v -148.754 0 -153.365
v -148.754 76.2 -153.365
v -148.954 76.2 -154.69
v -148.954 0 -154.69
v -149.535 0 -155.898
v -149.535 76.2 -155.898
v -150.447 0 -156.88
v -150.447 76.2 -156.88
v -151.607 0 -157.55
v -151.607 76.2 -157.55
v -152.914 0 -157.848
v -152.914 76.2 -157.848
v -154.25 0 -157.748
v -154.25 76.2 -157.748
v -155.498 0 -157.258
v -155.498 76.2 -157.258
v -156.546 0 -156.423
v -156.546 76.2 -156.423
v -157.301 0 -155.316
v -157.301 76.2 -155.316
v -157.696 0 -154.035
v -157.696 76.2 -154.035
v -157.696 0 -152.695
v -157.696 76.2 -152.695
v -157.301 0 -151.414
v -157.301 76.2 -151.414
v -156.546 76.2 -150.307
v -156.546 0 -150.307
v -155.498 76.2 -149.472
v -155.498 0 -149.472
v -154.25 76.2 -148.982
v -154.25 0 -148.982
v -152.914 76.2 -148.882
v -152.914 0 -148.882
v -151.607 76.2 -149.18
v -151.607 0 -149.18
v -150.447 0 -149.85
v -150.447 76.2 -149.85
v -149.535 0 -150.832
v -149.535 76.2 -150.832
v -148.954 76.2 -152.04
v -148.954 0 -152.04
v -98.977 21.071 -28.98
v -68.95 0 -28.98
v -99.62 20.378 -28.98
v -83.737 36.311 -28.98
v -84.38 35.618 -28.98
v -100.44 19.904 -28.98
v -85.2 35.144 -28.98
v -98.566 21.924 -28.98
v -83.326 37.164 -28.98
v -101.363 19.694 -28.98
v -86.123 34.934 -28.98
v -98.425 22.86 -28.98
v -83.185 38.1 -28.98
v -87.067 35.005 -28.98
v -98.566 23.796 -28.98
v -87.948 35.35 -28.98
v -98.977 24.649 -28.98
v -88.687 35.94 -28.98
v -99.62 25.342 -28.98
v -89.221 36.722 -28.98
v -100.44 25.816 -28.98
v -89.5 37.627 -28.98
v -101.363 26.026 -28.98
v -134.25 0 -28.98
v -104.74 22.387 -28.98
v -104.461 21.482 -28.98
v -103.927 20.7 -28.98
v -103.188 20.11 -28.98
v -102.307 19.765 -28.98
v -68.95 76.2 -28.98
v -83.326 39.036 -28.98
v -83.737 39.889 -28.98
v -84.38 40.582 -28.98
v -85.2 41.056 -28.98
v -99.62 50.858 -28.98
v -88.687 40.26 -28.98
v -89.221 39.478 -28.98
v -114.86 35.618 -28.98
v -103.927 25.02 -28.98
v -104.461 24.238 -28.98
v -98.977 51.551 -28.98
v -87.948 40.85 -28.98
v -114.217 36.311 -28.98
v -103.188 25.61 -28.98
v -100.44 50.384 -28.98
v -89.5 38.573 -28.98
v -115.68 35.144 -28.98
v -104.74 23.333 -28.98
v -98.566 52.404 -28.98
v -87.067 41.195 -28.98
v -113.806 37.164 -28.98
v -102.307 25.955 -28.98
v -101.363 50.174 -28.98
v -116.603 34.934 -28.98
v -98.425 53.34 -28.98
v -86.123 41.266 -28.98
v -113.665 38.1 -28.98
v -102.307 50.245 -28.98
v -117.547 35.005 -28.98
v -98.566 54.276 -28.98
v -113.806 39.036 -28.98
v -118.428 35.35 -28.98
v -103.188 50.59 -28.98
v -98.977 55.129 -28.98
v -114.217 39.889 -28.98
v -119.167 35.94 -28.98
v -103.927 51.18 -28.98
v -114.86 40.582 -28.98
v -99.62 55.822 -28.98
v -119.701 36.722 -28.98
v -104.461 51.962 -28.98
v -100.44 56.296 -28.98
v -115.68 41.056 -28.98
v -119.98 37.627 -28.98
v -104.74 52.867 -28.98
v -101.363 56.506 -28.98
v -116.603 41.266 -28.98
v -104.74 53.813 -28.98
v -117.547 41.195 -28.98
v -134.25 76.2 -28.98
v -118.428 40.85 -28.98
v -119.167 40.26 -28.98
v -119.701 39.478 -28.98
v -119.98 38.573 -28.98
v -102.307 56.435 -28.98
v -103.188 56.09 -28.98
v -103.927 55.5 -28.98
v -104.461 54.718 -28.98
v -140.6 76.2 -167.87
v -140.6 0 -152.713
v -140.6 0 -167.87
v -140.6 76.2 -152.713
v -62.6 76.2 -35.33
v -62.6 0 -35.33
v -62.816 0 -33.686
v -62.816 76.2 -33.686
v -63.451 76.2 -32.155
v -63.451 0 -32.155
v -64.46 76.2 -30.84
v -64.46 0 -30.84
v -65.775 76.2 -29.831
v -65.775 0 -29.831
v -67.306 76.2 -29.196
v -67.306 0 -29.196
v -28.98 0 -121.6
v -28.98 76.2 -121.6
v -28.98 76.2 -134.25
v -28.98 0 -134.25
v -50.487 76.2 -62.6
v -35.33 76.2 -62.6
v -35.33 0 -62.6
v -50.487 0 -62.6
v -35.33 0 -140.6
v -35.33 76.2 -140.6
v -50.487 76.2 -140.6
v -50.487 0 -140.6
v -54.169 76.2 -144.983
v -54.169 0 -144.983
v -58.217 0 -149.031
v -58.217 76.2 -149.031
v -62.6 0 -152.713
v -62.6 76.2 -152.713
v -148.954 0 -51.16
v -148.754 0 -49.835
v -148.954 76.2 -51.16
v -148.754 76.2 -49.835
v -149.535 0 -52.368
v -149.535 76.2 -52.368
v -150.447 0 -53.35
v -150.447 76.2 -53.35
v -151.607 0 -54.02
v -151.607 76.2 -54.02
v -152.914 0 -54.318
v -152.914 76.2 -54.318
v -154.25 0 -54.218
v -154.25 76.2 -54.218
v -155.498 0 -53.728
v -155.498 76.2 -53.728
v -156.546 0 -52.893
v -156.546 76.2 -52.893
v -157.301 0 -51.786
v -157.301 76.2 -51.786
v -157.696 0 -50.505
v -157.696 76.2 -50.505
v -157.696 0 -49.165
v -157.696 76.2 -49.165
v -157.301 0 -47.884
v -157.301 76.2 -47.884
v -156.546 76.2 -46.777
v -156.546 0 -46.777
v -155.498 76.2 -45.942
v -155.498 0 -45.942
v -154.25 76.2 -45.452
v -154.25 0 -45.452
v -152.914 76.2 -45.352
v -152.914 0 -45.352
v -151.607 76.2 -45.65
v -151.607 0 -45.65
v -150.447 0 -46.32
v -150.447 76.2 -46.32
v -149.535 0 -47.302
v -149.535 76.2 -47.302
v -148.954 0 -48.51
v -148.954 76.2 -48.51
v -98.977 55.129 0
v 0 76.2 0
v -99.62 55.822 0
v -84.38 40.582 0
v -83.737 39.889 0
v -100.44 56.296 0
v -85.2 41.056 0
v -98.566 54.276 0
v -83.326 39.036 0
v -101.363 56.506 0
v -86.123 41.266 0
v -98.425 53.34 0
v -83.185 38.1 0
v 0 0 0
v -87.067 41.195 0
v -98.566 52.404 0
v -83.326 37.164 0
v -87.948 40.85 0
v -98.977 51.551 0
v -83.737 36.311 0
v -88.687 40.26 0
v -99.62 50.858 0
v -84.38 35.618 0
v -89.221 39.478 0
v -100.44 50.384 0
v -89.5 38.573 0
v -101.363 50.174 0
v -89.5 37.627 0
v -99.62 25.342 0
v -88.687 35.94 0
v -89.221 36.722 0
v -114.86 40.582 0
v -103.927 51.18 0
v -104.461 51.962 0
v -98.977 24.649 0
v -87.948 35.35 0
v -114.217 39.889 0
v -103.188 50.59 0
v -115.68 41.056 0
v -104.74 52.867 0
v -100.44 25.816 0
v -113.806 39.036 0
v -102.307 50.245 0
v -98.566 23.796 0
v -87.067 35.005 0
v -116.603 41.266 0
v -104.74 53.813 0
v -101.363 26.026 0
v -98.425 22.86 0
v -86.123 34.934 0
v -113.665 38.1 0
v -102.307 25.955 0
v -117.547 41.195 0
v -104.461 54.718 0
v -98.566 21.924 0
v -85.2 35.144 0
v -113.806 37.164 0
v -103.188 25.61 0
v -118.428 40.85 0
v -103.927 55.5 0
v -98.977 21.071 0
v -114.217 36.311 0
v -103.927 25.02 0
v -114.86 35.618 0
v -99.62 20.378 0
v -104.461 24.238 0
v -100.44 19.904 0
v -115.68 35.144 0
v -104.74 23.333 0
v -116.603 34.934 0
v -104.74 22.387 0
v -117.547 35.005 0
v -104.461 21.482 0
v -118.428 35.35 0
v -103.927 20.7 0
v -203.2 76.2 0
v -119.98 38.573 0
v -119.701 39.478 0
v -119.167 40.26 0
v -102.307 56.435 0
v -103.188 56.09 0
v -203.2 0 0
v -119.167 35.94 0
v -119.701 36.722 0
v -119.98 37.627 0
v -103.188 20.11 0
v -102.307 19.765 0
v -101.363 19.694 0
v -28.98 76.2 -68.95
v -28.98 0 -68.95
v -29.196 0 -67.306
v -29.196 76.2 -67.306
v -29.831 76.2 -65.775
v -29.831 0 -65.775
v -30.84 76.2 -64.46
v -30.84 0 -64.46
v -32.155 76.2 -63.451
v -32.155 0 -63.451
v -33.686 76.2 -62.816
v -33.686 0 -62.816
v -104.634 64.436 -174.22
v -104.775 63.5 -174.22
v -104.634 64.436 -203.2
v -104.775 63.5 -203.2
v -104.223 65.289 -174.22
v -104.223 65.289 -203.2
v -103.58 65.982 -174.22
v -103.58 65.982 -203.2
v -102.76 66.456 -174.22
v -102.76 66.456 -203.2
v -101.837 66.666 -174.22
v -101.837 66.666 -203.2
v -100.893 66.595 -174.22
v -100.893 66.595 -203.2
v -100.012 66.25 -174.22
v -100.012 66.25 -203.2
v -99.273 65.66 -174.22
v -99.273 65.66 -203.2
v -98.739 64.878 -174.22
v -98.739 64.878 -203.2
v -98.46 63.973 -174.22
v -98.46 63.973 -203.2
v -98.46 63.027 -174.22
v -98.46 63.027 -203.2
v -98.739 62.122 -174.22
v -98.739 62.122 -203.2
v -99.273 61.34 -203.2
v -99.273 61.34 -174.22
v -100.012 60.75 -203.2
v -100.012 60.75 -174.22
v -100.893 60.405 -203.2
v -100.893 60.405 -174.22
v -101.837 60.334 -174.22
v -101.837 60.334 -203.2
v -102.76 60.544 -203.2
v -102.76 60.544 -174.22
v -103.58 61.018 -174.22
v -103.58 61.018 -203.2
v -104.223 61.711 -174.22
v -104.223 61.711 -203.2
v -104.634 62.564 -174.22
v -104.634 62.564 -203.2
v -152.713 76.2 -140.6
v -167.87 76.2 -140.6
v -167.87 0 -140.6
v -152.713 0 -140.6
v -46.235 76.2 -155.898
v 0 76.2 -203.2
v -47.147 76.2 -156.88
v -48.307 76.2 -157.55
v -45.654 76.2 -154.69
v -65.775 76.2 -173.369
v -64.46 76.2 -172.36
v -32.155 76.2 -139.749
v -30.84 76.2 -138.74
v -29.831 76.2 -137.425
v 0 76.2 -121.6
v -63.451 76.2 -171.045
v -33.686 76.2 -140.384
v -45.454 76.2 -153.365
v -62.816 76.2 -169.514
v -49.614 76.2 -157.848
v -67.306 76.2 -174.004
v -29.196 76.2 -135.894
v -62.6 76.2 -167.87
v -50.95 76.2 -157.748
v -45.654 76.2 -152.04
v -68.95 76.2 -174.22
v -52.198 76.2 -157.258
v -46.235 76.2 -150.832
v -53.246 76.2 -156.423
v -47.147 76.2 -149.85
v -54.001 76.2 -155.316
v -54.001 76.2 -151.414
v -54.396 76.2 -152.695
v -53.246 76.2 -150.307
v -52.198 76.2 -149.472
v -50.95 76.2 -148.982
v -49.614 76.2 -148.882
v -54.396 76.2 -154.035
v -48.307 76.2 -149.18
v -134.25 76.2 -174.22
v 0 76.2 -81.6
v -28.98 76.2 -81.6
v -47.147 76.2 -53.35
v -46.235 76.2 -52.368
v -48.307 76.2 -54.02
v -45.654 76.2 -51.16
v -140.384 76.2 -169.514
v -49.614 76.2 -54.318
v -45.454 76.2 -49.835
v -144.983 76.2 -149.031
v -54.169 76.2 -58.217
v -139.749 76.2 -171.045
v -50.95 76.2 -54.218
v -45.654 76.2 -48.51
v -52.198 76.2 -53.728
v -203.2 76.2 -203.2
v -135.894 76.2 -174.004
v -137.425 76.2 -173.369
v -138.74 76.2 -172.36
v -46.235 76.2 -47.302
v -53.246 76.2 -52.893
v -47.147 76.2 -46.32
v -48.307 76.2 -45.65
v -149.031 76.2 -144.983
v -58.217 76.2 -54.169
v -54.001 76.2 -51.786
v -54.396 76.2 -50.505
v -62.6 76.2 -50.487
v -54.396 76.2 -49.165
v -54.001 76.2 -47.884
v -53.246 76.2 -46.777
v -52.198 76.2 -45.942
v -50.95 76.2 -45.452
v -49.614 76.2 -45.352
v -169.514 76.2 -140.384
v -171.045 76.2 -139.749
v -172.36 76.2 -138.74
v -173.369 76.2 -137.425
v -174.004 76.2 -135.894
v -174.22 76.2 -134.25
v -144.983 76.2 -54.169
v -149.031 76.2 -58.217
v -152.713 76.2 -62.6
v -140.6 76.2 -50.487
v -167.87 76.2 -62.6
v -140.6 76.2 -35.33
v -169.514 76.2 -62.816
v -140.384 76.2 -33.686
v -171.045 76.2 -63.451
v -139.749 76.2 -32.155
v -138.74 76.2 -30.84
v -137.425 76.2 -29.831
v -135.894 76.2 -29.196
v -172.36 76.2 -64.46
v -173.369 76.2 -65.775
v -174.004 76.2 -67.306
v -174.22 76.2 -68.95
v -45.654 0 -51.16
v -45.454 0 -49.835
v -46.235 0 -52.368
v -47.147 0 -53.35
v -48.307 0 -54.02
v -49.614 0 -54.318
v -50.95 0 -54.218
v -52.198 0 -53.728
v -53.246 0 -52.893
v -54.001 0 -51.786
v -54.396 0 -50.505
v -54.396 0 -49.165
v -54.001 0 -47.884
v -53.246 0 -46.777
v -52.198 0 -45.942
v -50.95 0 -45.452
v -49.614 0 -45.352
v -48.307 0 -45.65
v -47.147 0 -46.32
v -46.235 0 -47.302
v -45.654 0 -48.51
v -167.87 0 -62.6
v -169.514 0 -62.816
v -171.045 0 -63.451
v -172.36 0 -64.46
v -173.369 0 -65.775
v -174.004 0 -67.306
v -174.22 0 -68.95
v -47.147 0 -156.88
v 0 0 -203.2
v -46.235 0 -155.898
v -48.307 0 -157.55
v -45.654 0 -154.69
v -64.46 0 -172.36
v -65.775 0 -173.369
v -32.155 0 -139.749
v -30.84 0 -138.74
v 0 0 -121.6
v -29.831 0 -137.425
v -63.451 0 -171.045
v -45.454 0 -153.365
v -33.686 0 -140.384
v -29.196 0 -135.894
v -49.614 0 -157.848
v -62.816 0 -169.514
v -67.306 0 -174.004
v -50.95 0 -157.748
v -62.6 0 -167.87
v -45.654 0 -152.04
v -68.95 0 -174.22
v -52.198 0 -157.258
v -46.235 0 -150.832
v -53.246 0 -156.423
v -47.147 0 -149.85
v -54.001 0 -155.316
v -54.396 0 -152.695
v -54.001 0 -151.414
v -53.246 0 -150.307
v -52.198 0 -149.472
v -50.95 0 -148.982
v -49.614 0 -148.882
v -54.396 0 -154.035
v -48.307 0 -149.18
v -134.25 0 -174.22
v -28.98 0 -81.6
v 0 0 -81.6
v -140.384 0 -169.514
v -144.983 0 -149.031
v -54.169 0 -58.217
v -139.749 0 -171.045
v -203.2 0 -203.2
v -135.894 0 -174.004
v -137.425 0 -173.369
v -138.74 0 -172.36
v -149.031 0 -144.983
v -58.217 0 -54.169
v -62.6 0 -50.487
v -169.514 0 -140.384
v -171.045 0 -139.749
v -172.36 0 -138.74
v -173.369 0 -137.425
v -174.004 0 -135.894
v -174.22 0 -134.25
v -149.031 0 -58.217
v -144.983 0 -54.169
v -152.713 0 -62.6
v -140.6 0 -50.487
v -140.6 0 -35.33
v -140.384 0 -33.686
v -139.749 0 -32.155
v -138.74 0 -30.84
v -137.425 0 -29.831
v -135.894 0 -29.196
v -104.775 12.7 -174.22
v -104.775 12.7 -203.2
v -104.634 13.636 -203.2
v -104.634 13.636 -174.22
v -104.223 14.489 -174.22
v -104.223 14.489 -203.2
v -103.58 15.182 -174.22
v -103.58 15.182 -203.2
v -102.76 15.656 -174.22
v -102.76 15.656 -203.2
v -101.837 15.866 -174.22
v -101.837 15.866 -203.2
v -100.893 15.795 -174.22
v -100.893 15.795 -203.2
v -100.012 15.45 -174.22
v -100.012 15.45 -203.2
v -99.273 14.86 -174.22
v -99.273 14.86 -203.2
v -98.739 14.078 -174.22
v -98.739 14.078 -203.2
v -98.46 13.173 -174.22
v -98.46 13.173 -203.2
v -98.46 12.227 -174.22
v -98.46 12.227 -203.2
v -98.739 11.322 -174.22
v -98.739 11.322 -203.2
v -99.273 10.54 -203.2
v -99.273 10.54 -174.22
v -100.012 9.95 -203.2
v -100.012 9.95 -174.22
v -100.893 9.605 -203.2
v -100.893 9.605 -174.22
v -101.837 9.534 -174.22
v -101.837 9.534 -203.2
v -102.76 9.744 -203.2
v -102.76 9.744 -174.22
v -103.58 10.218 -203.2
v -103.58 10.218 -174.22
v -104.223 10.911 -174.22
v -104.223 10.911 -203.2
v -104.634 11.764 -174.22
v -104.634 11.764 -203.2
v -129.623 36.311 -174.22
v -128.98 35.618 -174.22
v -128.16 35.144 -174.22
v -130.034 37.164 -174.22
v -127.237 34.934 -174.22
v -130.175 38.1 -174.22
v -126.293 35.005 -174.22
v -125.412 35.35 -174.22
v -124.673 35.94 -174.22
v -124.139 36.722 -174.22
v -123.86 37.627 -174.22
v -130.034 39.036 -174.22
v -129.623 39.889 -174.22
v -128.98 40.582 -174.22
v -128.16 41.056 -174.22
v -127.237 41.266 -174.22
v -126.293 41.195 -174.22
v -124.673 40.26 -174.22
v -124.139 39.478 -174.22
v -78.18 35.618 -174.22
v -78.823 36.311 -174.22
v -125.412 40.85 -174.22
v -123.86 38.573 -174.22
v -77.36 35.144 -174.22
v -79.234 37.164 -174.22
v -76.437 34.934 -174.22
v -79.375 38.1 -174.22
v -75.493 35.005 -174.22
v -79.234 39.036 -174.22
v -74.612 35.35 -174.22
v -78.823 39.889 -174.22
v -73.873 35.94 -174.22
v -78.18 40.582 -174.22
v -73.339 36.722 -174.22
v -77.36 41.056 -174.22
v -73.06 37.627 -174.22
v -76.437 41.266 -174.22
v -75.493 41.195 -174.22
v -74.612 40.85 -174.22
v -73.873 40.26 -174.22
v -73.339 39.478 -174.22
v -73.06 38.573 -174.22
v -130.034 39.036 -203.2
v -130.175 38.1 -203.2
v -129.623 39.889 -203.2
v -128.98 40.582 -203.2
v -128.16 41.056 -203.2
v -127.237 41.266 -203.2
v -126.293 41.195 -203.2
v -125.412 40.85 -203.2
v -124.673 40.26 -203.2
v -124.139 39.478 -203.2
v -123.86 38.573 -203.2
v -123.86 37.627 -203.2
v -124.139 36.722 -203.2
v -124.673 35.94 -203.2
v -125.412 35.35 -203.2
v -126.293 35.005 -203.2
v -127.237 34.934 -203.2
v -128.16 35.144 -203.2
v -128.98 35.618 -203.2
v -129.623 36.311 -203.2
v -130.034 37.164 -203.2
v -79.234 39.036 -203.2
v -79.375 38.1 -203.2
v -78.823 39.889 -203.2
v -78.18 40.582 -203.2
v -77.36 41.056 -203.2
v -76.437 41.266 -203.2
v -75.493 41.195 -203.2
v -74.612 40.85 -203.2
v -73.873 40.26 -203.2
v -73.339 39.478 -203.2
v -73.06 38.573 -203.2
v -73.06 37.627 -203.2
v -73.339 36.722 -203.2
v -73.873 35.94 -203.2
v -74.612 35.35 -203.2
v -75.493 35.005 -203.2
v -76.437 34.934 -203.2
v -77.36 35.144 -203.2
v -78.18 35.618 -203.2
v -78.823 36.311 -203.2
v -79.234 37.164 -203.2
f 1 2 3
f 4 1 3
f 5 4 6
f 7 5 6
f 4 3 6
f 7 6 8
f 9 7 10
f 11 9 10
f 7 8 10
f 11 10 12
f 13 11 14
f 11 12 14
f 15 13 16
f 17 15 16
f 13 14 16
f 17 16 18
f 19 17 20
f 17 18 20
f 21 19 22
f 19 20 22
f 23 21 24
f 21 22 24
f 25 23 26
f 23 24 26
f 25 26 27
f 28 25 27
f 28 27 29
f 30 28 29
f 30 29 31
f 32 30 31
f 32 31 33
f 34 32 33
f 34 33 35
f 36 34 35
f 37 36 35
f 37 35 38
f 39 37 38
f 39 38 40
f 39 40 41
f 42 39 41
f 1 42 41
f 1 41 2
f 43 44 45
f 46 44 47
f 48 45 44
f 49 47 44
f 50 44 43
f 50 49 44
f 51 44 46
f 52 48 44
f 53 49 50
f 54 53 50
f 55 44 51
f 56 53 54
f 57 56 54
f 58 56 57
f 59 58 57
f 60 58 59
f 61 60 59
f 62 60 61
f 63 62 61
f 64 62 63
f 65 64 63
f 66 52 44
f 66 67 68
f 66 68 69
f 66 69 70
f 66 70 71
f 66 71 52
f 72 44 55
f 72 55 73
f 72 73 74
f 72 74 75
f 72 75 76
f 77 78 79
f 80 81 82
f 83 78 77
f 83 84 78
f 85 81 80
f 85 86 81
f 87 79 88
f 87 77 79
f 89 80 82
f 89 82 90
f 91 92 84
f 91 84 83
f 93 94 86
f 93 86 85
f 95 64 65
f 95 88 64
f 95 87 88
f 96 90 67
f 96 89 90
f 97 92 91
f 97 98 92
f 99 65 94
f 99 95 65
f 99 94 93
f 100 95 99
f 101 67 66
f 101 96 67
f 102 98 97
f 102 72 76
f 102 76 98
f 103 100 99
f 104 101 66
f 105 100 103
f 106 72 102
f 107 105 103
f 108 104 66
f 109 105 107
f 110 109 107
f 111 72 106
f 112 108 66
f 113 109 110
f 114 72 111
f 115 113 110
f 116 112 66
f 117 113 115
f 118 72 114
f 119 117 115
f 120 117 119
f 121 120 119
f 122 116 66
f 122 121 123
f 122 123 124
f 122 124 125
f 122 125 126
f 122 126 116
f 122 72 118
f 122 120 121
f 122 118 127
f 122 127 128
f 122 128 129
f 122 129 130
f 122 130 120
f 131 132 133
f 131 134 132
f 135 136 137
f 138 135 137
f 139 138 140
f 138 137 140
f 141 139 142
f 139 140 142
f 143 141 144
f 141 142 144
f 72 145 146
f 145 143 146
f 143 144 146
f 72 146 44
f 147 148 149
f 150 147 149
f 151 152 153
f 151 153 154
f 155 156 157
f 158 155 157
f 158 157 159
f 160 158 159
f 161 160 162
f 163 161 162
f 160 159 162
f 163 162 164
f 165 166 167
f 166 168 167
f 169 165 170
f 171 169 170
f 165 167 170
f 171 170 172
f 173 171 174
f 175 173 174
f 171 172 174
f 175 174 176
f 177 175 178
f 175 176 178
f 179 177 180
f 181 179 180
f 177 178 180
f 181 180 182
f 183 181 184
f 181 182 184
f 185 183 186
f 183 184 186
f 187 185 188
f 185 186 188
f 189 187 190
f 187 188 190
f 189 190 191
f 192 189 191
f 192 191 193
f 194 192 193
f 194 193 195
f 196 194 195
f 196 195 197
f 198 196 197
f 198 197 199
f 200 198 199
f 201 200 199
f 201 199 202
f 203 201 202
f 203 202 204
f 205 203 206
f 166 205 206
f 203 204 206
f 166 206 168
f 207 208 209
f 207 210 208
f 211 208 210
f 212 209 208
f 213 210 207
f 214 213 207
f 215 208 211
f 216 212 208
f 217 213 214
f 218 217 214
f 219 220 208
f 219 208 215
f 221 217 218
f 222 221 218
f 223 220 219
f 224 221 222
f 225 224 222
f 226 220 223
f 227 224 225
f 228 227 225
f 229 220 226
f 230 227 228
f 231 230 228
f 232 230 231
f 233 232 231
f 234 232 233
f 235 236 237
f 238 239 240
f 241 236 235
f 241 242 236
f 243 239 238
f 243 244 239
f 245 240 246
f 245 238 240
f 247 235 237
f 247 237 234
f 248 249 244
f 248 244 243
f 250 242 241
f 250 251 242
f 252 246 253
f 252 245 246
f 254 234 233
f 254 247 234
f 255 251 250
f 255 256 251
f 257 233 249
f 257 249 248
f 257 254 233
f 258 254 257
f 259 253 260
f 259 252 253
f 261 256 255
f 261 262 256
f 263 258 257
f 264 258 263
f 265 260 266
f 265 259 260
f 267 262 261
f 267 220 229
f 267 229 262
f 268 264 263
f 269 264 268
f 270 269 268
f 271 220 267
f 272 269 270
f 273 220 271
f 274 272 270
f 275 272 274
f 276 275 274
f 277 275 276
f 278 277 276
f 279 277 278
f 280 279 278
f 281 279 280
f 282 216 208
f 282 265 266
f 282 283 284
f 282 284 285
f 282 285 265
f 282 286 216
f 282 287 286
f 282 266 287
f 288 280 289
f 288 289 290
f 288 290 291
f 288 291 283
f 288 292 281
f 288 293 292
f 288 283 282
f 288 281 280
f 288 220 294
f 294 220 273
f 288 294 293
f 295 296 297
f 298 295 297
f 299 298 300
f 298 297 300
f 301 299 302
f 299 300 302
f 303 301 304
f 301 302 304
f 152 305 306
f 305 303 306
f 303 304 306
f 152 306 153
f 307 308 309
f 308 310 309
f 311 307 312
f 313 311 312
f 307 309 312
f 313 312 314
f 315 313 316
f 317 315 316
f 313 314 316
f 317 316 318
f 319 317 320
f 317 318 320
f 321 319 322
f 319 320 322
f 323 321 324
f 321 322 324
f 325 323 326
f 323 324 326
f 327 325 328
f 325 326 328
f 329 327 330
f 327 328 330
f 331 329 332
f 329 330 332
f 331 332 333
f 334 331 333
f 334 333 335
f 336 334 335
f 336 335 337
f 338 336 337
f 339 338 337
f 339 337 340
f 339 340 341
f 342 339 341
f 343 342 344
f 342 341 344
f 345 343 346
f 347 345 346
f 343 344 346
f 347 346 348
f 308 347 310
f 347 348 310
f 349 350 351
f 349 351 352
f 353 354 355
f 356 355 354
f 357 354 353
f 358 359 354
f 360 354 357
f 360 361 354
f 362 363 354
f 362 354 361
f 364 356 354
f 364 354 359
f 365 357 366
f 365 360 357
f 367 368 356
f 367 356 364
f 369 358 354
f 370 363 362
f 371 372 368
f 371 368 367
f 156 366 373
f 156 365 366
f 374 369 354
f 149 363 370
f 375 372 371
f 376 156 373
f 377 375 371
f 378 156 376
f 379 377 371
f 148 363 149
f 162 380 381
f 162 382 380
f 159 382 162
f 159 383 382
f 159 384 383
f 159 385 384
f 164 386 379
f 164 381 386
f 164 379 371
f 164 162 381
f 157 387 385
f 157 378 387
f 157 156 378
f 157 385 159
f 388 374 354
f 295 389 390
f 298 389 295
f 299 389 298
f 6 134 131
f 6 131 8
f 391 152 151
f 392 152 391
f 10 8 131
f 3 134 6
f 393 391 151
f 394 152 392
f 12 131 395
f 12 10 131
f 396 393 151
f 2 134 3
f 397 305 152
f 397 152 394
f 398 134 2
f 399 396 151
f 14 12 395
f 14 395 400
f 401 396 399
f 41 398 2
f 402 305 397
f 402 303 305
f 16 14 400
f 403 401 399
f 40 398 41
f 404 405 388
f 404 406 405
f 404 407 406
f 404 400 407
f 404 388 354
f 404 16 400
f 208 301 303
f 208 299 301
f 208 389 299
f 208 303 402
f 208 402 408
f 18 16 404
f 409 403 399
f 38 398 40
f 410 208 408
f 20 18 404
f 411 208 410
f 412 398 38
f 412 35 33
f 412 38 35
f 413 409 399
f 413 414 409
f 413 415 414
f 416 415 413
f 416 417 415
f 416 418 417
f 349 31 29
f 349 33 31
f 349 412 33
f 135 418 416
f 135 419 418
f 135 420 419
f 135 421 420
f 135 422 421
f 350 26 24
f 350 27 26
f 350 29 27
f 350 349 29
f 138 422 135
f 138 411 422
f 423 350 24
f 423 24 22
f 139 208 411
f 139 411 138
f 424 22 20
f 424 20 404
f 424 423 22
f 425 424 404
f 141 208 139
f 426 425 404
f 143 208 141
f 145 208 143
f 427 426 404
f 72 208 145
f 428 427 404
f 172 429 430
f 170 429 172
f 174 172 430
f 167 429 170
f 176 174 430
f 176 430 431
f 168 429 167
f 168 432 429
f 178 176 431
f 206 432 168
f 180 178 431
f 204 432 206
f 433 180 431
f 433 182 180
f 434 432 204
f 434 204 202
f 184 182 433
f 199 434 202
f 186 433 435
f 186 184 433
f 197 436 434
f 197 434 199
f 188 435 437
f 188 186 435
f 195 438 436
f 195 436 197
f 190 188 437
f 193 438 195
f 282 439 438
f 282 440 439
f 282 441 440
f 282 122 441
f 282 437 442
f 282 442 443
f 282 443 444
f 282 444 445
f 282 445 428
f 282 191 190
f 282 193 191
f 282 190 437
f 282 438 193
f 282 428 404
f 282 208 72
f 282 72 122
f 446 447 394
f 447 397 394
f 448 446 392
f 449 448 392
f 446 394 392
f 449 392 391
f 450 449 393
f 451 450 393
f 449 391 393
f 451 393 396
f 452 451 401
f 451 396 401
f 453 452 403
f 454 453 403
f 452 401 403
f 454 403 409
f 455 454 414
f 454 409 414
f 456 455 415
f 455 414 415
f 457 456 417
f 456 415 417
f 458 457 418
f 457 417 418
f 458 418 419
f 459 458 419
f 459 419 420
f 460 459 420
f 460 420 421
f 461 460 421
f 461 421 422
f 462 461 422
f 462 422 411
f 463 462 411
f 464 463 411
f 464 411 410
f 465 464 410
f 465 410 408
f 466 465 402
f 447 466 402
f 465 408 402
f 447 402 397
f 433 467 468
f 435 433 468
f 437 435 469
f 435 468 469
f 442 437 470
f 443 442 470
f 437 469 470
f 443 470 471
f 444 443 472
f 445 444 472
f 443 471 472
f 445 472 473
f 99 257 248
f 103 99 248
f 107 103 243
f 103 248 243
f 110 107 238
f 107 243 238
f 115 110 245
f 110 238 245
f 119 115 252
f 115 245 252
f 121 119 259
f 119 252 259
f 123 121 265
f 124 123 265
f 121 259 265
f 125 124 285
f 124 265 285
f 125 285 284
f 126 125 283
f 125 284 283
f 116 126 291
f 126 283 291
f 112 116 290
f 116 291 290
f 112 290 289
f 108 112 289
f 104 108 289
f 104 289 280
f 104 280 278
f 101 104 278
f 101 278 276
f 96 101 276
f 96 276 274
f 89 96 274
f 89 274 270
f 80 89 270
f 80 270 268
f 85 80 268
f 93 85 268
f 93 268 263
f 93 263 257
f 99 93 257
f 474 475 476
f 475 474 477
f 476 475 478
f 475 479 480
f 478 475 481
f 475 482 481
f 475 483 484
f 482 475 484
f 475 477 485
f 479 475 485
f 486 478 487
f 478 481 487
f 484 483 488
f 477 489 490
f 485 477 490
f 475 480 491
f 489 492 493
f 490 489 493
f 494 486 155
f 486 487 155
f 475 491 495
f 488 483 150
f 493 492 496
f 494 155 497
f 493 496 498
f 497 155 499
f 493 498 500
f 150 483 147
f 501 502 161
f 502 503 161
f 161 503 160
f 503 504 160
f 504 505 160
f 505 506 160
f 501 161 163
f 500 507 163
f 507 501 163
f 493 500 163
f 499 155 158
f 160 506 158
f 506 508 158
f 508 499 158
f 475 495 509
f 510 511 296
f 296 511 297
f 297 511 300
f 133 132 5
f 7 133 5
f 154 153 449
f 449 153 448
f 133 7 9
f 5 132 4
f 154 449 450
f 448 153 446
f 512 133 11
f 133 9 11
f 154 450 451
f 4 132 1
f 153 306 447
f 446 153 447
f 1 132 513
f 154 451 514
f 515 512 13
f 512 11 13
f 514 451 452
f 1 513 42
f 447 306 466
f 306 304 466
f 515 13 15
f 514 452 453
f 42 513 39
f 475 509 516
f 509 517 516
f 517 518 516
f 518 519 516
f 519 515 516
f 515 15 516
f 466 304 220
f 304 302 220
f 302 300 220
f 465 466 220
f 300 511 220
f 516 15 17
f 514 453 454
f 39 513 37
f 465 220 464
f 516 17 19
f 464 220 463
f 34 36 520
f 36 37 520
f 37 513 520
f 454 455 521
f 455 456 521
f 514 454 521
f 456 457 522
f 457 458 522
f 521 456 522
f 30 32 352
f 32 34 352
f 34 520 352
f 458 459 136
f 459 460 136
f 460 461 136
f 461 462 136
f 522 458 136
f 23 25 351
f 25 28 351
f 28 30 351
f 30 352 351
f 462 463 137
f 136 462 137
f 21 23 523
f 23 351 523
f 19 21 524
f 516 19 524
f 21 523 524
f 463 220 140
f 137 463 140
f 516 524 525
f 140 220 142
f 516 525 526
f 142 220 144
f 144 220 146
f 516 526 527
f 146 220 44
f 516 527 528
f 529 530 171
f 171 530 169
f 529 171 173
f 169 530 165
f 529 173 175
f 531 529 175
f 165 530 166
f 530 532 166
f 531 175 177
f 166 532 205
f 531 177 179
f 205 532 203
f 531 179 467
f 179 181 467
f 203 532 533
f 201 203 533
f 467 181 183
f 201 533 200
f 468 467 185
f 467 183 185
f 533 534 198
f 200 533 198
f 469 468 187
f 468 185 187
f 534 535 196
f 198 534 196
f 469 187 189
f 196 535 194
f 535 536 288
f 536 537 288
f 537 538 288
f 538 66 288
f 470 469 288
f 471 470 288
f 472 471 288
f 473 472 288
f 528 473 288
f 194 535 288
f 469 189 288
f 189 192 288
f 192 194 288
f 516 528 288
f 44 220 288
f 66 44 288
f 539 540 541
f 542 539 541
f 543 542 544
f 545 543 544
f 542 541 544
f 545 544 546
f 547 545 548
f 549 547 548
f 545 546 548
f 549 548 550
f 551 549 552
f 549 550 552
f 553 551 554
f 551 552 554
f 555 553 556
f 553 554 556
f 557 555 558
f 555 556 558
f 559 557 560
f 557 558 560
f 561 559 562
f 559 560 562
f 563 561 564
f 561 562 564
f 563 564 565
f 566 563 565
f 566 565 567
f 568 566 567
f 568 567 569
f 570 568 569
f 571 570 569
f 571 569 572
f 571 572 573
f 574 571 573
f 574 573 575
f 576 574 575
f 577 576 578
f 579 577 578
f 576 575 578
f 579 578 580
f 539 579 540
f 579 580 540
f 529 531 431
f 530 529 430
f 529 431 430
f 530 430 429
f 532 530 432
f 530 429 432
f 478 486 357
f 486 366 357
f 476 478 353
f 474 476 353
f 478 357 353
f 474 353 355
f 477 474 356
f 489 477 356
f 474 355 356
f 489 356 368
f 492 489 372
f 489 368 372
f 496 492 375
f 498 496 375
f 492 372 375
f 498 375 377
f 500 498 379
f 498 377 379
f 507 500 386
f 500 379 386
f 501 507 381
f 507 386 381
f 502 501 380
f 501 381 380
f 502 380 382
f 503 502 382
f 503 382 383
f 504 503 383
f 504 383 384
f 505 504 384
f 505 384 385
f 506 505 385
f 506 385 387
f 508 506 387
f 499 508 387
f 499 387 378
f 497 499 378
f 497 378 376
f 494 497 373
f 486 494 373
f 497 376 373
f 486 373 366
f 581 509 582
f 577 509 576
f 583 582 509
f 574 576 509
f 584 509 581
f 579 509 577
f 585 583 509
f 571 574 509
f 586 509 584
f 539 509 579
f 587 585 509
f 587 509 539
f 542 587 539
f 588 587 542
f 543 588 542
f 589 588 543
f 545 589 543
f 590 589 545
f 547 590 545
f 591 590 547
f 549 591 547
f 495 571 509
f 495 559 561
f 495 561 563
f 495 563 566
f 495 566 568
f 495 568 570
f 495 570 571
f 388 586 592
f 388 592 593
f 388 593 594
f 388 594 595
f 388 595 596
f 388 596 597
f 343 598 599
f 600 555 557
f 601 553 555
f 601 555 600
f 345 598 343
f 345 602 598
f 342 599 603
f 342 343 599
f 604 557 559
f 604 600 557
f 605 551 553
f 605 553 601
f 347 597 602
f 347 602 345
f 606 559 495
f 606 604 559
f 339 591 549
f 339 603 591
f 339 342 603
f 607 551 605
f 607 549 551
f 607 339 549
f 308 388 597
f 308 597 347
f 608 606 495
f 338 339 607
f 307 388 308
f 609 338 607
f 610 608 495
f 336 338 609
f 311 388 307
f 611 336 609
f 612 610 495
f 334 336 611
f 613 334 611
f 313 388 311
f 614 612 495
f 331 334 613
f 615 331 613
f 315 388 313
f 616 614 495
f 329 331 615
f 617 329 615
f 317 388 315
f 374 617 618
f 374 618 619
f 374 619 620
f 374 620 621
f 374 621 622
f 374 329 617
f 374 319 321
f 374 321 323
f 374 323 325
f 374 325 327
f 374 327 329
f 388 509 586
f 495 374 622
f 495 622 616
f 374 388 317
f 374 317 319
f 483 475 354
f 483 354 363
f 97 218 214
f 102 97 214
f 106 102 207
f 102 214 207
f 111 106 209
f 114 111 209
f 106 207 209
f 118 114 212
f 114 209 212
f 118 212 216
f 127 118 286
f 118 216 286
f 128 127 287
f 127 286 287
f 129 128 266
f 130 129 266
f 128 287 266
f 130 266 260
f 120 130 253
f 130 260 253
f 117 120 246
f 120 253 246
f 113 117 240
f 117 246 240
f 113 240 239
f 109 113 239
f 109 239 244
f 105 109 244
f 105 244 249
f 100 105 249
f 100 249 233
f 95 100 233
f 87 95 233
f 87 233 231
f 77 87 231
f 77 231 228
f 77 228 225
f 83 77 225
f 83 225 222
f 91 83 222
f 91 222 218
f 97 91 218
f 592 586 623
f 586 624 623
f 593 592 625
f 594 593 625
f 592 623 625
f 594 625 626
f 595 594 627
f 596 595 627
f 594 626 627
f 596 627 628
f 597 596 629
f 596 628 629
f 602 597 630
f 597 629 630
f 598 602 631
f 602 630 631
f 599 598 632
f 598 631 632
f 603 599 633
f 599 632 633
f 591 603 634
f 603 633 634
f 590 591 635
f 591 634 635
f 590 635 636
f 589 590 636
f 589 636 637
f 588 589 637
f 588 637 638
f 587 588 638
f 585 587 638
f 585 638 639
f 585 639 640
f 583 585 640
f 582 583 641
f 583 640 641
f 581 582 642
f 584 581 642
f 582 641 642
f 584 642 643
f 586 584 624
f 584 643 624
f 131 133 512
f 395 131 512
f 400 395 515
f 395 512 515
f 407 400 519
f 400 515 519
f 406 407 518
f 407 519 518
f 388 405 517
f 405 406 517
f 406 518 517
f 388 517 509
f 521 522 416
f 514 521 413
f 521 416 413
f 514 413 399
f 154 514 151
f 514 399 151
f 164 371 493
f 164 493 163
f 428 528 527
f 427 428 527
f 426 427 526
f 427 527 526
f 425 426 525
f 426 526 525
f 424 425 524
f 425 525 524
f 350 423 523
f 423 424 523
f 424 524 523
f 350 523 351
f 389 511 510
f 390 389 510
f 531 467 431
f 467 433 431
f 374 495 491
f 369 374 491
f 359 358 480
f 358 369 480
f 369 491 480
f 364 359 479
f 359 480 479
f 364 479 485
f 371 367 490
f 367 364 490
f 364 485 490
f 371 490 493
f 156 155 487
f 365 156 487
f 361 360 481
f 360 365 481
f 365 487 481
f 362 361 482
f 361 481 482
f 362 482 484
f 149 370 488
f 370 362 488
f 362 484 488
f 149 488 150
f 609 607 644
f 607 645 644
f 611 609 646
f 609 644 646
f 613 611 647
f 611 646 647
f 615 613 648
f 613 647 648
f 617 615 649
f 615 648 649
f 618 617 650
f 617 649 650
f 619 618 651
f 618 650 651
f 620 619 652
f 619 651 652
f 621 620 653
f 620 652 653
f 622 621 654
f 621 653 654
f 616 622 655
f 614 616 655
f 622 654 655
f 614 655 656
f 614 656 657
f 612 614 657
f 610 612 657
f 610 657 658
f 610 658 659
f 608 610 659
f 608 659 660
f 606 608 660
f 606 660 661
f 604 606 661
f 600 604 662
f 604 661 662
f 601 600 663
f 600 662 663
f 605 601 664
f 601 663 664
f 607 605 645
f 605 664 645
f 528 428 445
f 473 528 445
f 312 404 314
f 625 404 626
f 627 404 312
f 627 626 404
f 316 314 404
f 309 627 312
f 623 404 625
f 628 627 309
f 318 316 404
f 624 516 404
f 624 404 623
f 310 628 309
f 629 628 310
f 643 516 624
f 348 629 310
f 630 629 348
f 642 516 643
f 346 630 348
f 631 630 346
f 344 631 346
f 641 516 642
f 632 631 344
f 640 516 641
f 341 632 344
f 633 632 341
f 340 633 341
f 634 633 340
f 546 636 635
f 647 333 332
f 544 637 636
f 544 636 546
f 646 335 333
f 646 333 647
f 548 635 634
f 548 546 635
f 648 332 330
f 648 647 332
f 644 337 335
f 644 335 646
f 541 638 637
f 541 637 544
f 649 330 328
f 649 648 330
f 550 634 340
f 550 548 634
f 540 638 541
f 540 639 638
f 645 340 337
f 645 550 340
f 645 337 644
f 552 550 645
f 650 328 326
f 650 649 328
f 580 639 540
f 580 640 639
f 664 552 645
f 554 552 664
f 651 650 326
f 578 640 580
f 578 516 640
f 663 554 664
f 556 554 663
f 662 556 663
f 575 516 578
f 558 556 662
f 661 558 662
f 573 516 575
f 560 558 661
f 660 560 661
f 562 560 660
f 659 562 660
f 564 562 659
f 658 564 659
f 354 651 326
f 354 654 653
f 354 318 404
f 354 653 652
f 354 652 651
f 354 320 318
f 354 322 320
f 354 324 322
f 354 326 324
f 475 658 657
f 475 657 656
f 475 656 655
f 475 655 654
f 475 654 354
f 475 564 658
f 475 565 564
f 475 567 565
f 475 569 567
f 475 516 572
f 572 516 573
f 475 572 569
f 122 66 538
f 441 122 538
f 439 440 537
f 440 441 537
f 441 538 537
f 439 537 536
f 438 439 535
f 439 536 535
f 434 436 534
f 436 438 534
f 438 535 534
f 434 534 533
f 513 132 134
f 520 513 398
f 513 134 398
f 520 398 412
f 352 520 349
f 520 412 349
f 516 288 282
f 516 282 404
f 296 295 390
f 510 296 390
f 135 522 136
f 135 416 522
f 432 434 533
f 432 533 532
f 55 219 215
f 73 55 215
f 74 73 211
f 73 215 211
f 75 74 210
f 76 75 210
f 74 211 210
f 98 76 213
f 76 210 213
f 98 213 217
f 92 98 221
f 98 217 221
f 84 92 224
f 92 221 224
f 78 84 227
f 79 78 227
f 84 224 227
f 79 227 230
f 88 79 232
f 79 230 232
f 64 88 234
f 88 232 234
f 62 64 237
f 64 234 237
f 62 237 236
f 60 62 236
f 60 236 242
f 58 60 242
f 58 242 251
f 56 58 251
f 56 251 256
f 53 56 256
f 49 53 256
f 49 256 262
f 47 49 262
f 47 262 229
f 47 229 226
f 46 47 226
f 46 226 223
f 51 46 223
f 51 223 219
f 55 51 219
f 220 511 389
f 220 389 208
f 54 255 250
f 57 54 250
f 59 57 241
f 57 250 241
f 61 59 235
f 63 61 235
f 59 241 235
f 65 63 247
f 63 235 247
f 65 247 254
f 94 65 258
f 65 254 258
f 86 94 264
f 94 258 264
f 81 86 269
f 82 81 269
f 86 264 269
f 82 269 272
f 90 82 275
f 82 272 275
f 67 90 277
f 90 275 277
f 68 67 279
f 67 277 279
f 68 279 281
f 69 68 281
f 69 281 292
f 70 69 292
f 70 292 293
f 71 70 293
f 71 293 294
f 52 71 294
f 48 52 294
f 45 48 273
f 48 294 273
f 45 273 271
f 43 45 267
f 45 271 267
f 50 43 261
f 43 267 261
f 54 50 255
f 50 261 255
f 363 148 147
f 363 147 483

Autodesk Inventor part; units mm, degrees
ref_plane "YZ Plane" through (0, 0, 0) normal (1, 0, 0) x (0, 1, 0)
ref_plane "XZ Plane" through (0, 0, 0) normal (0, 1, 0) x (-1, 0, 0)
ref_plane "XY Plane" through (0, 0, 0) normal (0, 0, 1) x (1, 0, 0)
sketch "Sketch15" plane through (0, 0, 0) normal (0, 1, 0) x (-1, 0, 0)
  line L0 (0, 0) -> (203.2, 0)
  line L1 (203.2, 0) -> (203.2, -203.2)
  line L2 (203.2, -203.2) -> (0, -203.2)
  line L3 (0, -203.2) -> (0, 0)
  dimension "d149" = 203.2
  dimension "d150" = 203.2
extrude "Extrusion15" add sketch "Sketch15" along normal blind 76.2
sketch "Sketch16" plane through (0, 76.2, 0) normal (0, 1, 0) x (1, 0, 0)
  line L0 (-166.6, 166.6) -> (-36.6, 166.6)
  line L1 (-36.6, 166.6) -> (-36.6, 36.6)
  line L2 (-36.6, 36.6) -> (-166.6, 36.6)
  line L3 (-166.6, 36.6) -> (-166.6, 166.6)
  line L4 (0, 0) -> (0, 203.2) projected
  dimension "d153" = 130
  dimension "d154" = 130
  dimension "d155" = 36.6
  dimension "d156" = 36.6
extrude "Extrusion16" cut sketch "Sketch16" against normal through all
sketch "Sketch17" plane through (-203.2, 0, 0) normal (0, 0, 1) x (1, 0, 0)
  line L0 (203.2, 0) -> (0, 0) projected
  line L1 (0, 0) -> (0, 38.1)
  line L2 (0, 38.1) -> (101.6, 38.1)
  circle A0 centre (116.84, 38.1) radius 3.175
  circle A1 centre (101.6, 53.34) radius 3.175
  circle A2 centre (86.36, 38.1) radius 3.175
  circle A3 centre (101.6, 22.86) radius 3.175
  dimension "d159" = 101.6
  dimension "d160" = 38.1
  dimension "d161" = 6.35
  dimension "d162" = 15.24
  dimension "d163" = 0
  dimension "d166" = 360
extrude "Extrusion17" cut sketch "Sketch17" against normal blind 101.6
sketch "Sketch19" plane through (0, 76.2, 0) normal (0, 1, 0) x (1, 0, 0)
  line L0 (-36.6, 36.6) -> (-36.6, 166.6) projected
  line L1 (-36.6, 121.6) -> (0.103, 121.6)
  line L2 (0.103, 121.6) -> (0.103, 81.6)
  line L3 (0.103, 81.6) -> (-36.6, 81.6)
  line L4 (-36.6, 81.6) -> (-36.6, 121.6)
  line L5 (-166.6, 166.6) -> (-36.6, 166.6) projected
  point P0 (0, 0)
  dimension "d170" = 40
  dimension "d171" = 45
  dimension "d172" = 36.703
sketch "Sketch22" plane through (0, 76.2, 0) normal (0, 1, 0) x (1, 0, 0)
  line L0 (-166.6, 36.6) -> (-166.6, 62.6)
  line L1 (-166.6, 36.6) -> (-140.6, 36.6)
  line L2 (-140.6, 36.6) -> (-140.6, 50.487)
  line L3 (-166.6, 62.6) -> (-152.713, 62.6)
  arc A0 (-152.713, 62.6) -> (-140.6, 50.487) centre (-100.3536, 102.8464) ccw
  circle A1 centre (-153.25, 49.835) radius 4.4958
  line L4 (-166.6, 166.6) -> (-166.6, 140.6)
  line L5 (-166.6, 166.6) -> (-140.6, 166.6)
  line L6 (-166.6, 140.6) -> (-152.713, 140.6)
  line L7 (-140.6, 166.6) -> (-140.6, 152.713)
  arc A2 (-140.6, 152.713) -> (-152.713, 140.6) centre (-100.3536, 100.3536) ccw
  circle A3 centre (-153.25, 153.365) radius 4.4958
  line L8 (-101.6, 36.6) -> (-101.6, 166.6)
  line L9 (-166.6, 166.6) -> (-140.6, 166.6)
  line L10 (-166.6, 140.6) -> (-166.6, 166.6)
  line L11 (-166.6, 36.6) -> (-140.6, 36.6)
  line L12 (-166.6, 166.6) -> (-166.6, 140.6)
  line L13 (-36.6, 36.6) -> (-36.6, 62.6)
  line L14 (-36.6, 36.6) -> (-62.6, 36.6)
  line L15 (-62.6, 36.6) -> (-62.6, 50.487)
  line L16 (-36.6, 62.6) -> (-50.487, 62.6)
  arc A4 (-62.6, 50.487) -> (-50.487, 62.6) centre (-102.8464, 102.8464) ccw
  circle A5 centre (-49.95, 49.835) radius 4.4958
  line L17 (-36.6, 166.6) -> (-36.6, 140.6)
  line L18 (-36.6, 166.6) -> (-62.6, 166.6)
  line L19 (-36.6, 140.6) -> (-50.487, 140.6)
  line L20 (-62.6, 166.6) -> (-62.6, 152.713)
  arc A6 (-50.487, 140.6) -> (-62.6, 152.713) centre (-102.8464, 100.3536) ccw
  circle A7 centre (-49.95, 153.365) radius 4.4958
  point P0 (0, 0)
  dimension "d191" = 26
  dimension "d206" = 13.887
  dimension "d207" = 13.887
  dimension "d208" = 66.04
  dimension "d210" = 13.35
  dimension "d214" = 8.9916
  dimension "d217" = 12.765
  dimension "d218" = 26
  dimension "d219" = 26
  dimension "d220" = 13.887
  dimension "d221" = 13.887
  dimension "d222" = 66.04
  dimension "d223" = 8.9916
  dimension "d224" = 12.765
  dimension "d225" = 13.35
  dimension "d232" = 90
  dimension "d233" = 26
  dimension "d234" = 65
  dimension "d235" = 130
  dimension "d236" = 0
sketch "Sketch23" plane through (0, 0, -203.2) normal (0, 0, -1) x (-1, 0, 0)
  line L0 (0, 0) -> (0, 38.1)
  circle A0 centre (127, 38.1) radius 3.175
  line L1 (0, 38.1) -> (101.6, 38.1)
  circle A1 centre (101.6, 63.5) radius 3.175
  circle A2 centre (76.2, 38.1) radius 3.175
  circle A3 centre (101.6, 12.7) radius 3.175
  dimension "d180" = 101.6
  dimension "d181" = 38.1
  dimension "d182" = 25.4
  dimension "d183" = 0
  dimension "d184" = 6.35
  dimension "d187" = 360
extrude "Extrusion20" cut sketch "Sketch23" against normal blind 101.6
extrude "Extrusion28" add sketch "Sketch22" against normal blind 76.2
sketch "Sketch26" plane through (0, 76.2, 0) normal (0, 1, 0) x (1, 0, 0)
  line L0 (-62.6, 166.6) -> (-140.6, 166.6)
  line L1 (-140.6, 166.6) -> (-140.6, 174.22)
  line L2 (-140.6, 174.22) -> (-62.6, 174.22)
  line L3 (-62.6, 174.22) -> (-62.6, 166.6)
  line L4 (-140.6, 152.713) -> (-140.6, 166.6) projected
  line L5 (-140.6, 36.6) -> (-140.6, 50.487) projected
  line L6 (-140.6, 36.6) -> (-62.6, 36.6)
  line L7 (-62.6, 36.6) -> (-62.6, 28.98)
  line L8 (-62.6, 28.98) -> (-140.6, 28.98)
  line L9 (-140.6, 28.98) -> (-140.6, 36.6)
  line L10 (-62.6, 50.487) -> (-62.6, 36.6) projected
  point P0 (0, 0)
  dimension "d242" = 0
  dimension "d243" = 7.62
  dimension "d244" = 0
  dimension "d245" = 7.62
extrude "Extrusion29" cut sketch "Sketch26" against normal through all
sketch "Sketch28" plane through (0, 76.2, 0) normal (0, 1, 0) x (1, 0, 0)
  line L0 (-166.6, 140.6) -> (-166.6, 62.6) projected
  line L1 (-166.6, 140.6) -> (-174.22, 140.6)
  line L2 (-174.22, 140.6) -> (-174.22, 62.6)
  line L3 (-174.22, 62.6) -> (-166.6, 62.6)
  line L4 (-166.6, 62.6) -> (-166.6, 140.6)
  line L5 (-152.713, 62.6) -> (-166.6, 62.6) projected
  line L6 (-36.6, 62.6) -> (-36.6, 140.6) projected
  line L7 (-36.6, 62.6) -> (-28.98, 62.6)
  line L8 (-28.98, 62.6) -> (-28.98, 140.6)
  line L9 (-28.98, 140.6) -> (-36.6, 140.6)
  line L10 (-36.6, 140.6) -> (-36.6, 62.6)
  line L11 (-50.487, 140.6) -> (-36.6, 140.6) projected
  point P0 (0, 0)
  point P1 (-170.41, 62.6)
  dimension "d253" = 0
  dimension "d254" = 7.62
  dimension "d255" = 0
  dimension "d256" = 7.62
extrude "Extrusion30" cut sketch "Sketch28" against normal through all
fillet "Fillet9" radius 6.35 8 edges at (-140.6, 38.1, -174.22) (-62.6, 38.1, -174.22) (-28.98, 38.1, -140.6) (-28.98, 38.1, -62.6) (-62.6, 38.1, -28.98) (-140.6, 38.1, -28.98) (-174.22, 38.1, -62.6) (-174.22, 38.1, -140.6)
extrude "Extrusion31" cut sketch "Sketch19" against normal through all
properties part number "FrontPlateV2"
